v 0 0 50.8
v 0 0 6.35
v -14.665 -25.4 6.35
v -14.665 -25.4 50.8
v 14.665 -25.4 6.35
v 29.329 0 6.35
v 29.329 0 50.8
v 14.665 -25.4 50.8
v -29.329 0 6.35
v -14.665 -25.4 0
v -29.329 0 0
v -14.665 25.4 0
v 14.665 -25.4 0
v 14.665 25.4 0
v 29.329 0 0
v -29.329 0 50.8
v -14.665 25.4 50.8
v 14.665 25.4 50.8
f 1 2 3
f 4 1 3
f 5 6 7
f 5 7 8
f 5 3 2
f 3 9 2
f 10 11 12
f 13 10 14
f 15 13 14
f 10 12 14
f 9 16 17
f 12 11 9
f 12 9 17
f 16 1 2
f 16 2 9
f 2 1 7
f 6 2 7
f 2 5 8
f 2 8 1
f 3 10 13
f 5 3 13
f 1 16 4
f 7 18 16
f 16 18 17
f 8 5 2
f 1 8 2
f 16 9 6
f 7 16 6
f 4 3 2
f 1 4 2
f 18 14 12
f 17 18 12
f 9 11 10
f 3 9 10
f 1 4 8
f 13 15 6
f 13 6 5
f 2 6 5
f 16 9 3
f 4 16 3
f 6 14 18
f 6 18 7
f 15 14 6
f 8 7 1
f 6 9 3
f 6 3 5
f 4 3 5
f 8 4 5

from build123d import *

# Parameters (mm, degrees)
BOSS_EXTRUDE5_DEPTH = 50.8
BOSS_EXTRUDE6_DEPTH = 6.35
BOSS_EXTRUDE7_START = 6.35
BOSS_EXTRUDE7_DEPTH = 44.45
BOSS_EXTRUDE8_START = 6.35
BOSS_EXTRUDE8_DEPTH = 44.45
BOSS_EXTRUDE9_START = 6.35
BOSS_EXTRUDE9_DEPTH = 44.45


with BuildPart() as part:
    # Sketch1 → Boss-Extrude5 (new body)
    with BuildSketch(Plane.XY):
        Polygon((0, 0), (-29.329393675, 0), (-14.664696837, 25.4), align=None)
        Polygon((-14.664696837, 25.4), (0, 0), (14.664696837, 25.4), align=None)
        Polygon((0, 0), (14.664696837, 25.4), (29.329393675, 0), align=None)
    extrude(amount=BOSS_EXTRUDE5_DEPTH)

    # Sketch1<8> → Boss-Extrude6 (add)
    with BuildSketch(Plane.XY):
        Polygon((-29.329393675, 0), (-14.664696837, -25.4), (0, 0), align=None)
        Polygon((-14.664696837, -25.4), (14.664696837, -25.4), (0, 0), align=None)
        Polygon((14.664696837, -25.4), (0, 0), (29.329393675, 0), align=None)
    extrude(amount=BOSS_EXTRUDE6_DEPTH)


with BuildPart() as body_2:
    # Sketch1<9> → Boss-Extrude7 (new body)
    with BuildSketch(Plane.XY.offset(BOSS_EXTRUDE7_START)):
        Polygon((-29.329393675, 0), (-14.664696837, -25.4), (0, 0), align=None)
    extrude(amount=BOSS_EXTRUDE7_DEPTH)


with BuildPart() as body_3:
    # Sketch1<10> → Boss-Extrude8 (new body)
    with BuildSketch(Plane.XY.offset(BOSS_EXTRUDE8_START)):
        Polygon((-14.664696837, -25.4), (14.664696837, -25.4), (0, 0), align=None)
    extrude(amount=BOSS_EXTRUDE8_DEPTH)


with BuildPart() as body_4:
    # Sketch1<11> → Boss-Extrude9 (new body)
    with BuildSketch(Plane.XY.offset(BOSS_EXTRUDE9_START)):
        Polygon((14.664696837, -25.4), (0, 0), (29.329393675, 0), align=None)
    extrude(amount=BOSS_EXTRUDE9_DEPTH)


solid = Compound([part.part, body_2.part, body_3.part, body_4.part])
